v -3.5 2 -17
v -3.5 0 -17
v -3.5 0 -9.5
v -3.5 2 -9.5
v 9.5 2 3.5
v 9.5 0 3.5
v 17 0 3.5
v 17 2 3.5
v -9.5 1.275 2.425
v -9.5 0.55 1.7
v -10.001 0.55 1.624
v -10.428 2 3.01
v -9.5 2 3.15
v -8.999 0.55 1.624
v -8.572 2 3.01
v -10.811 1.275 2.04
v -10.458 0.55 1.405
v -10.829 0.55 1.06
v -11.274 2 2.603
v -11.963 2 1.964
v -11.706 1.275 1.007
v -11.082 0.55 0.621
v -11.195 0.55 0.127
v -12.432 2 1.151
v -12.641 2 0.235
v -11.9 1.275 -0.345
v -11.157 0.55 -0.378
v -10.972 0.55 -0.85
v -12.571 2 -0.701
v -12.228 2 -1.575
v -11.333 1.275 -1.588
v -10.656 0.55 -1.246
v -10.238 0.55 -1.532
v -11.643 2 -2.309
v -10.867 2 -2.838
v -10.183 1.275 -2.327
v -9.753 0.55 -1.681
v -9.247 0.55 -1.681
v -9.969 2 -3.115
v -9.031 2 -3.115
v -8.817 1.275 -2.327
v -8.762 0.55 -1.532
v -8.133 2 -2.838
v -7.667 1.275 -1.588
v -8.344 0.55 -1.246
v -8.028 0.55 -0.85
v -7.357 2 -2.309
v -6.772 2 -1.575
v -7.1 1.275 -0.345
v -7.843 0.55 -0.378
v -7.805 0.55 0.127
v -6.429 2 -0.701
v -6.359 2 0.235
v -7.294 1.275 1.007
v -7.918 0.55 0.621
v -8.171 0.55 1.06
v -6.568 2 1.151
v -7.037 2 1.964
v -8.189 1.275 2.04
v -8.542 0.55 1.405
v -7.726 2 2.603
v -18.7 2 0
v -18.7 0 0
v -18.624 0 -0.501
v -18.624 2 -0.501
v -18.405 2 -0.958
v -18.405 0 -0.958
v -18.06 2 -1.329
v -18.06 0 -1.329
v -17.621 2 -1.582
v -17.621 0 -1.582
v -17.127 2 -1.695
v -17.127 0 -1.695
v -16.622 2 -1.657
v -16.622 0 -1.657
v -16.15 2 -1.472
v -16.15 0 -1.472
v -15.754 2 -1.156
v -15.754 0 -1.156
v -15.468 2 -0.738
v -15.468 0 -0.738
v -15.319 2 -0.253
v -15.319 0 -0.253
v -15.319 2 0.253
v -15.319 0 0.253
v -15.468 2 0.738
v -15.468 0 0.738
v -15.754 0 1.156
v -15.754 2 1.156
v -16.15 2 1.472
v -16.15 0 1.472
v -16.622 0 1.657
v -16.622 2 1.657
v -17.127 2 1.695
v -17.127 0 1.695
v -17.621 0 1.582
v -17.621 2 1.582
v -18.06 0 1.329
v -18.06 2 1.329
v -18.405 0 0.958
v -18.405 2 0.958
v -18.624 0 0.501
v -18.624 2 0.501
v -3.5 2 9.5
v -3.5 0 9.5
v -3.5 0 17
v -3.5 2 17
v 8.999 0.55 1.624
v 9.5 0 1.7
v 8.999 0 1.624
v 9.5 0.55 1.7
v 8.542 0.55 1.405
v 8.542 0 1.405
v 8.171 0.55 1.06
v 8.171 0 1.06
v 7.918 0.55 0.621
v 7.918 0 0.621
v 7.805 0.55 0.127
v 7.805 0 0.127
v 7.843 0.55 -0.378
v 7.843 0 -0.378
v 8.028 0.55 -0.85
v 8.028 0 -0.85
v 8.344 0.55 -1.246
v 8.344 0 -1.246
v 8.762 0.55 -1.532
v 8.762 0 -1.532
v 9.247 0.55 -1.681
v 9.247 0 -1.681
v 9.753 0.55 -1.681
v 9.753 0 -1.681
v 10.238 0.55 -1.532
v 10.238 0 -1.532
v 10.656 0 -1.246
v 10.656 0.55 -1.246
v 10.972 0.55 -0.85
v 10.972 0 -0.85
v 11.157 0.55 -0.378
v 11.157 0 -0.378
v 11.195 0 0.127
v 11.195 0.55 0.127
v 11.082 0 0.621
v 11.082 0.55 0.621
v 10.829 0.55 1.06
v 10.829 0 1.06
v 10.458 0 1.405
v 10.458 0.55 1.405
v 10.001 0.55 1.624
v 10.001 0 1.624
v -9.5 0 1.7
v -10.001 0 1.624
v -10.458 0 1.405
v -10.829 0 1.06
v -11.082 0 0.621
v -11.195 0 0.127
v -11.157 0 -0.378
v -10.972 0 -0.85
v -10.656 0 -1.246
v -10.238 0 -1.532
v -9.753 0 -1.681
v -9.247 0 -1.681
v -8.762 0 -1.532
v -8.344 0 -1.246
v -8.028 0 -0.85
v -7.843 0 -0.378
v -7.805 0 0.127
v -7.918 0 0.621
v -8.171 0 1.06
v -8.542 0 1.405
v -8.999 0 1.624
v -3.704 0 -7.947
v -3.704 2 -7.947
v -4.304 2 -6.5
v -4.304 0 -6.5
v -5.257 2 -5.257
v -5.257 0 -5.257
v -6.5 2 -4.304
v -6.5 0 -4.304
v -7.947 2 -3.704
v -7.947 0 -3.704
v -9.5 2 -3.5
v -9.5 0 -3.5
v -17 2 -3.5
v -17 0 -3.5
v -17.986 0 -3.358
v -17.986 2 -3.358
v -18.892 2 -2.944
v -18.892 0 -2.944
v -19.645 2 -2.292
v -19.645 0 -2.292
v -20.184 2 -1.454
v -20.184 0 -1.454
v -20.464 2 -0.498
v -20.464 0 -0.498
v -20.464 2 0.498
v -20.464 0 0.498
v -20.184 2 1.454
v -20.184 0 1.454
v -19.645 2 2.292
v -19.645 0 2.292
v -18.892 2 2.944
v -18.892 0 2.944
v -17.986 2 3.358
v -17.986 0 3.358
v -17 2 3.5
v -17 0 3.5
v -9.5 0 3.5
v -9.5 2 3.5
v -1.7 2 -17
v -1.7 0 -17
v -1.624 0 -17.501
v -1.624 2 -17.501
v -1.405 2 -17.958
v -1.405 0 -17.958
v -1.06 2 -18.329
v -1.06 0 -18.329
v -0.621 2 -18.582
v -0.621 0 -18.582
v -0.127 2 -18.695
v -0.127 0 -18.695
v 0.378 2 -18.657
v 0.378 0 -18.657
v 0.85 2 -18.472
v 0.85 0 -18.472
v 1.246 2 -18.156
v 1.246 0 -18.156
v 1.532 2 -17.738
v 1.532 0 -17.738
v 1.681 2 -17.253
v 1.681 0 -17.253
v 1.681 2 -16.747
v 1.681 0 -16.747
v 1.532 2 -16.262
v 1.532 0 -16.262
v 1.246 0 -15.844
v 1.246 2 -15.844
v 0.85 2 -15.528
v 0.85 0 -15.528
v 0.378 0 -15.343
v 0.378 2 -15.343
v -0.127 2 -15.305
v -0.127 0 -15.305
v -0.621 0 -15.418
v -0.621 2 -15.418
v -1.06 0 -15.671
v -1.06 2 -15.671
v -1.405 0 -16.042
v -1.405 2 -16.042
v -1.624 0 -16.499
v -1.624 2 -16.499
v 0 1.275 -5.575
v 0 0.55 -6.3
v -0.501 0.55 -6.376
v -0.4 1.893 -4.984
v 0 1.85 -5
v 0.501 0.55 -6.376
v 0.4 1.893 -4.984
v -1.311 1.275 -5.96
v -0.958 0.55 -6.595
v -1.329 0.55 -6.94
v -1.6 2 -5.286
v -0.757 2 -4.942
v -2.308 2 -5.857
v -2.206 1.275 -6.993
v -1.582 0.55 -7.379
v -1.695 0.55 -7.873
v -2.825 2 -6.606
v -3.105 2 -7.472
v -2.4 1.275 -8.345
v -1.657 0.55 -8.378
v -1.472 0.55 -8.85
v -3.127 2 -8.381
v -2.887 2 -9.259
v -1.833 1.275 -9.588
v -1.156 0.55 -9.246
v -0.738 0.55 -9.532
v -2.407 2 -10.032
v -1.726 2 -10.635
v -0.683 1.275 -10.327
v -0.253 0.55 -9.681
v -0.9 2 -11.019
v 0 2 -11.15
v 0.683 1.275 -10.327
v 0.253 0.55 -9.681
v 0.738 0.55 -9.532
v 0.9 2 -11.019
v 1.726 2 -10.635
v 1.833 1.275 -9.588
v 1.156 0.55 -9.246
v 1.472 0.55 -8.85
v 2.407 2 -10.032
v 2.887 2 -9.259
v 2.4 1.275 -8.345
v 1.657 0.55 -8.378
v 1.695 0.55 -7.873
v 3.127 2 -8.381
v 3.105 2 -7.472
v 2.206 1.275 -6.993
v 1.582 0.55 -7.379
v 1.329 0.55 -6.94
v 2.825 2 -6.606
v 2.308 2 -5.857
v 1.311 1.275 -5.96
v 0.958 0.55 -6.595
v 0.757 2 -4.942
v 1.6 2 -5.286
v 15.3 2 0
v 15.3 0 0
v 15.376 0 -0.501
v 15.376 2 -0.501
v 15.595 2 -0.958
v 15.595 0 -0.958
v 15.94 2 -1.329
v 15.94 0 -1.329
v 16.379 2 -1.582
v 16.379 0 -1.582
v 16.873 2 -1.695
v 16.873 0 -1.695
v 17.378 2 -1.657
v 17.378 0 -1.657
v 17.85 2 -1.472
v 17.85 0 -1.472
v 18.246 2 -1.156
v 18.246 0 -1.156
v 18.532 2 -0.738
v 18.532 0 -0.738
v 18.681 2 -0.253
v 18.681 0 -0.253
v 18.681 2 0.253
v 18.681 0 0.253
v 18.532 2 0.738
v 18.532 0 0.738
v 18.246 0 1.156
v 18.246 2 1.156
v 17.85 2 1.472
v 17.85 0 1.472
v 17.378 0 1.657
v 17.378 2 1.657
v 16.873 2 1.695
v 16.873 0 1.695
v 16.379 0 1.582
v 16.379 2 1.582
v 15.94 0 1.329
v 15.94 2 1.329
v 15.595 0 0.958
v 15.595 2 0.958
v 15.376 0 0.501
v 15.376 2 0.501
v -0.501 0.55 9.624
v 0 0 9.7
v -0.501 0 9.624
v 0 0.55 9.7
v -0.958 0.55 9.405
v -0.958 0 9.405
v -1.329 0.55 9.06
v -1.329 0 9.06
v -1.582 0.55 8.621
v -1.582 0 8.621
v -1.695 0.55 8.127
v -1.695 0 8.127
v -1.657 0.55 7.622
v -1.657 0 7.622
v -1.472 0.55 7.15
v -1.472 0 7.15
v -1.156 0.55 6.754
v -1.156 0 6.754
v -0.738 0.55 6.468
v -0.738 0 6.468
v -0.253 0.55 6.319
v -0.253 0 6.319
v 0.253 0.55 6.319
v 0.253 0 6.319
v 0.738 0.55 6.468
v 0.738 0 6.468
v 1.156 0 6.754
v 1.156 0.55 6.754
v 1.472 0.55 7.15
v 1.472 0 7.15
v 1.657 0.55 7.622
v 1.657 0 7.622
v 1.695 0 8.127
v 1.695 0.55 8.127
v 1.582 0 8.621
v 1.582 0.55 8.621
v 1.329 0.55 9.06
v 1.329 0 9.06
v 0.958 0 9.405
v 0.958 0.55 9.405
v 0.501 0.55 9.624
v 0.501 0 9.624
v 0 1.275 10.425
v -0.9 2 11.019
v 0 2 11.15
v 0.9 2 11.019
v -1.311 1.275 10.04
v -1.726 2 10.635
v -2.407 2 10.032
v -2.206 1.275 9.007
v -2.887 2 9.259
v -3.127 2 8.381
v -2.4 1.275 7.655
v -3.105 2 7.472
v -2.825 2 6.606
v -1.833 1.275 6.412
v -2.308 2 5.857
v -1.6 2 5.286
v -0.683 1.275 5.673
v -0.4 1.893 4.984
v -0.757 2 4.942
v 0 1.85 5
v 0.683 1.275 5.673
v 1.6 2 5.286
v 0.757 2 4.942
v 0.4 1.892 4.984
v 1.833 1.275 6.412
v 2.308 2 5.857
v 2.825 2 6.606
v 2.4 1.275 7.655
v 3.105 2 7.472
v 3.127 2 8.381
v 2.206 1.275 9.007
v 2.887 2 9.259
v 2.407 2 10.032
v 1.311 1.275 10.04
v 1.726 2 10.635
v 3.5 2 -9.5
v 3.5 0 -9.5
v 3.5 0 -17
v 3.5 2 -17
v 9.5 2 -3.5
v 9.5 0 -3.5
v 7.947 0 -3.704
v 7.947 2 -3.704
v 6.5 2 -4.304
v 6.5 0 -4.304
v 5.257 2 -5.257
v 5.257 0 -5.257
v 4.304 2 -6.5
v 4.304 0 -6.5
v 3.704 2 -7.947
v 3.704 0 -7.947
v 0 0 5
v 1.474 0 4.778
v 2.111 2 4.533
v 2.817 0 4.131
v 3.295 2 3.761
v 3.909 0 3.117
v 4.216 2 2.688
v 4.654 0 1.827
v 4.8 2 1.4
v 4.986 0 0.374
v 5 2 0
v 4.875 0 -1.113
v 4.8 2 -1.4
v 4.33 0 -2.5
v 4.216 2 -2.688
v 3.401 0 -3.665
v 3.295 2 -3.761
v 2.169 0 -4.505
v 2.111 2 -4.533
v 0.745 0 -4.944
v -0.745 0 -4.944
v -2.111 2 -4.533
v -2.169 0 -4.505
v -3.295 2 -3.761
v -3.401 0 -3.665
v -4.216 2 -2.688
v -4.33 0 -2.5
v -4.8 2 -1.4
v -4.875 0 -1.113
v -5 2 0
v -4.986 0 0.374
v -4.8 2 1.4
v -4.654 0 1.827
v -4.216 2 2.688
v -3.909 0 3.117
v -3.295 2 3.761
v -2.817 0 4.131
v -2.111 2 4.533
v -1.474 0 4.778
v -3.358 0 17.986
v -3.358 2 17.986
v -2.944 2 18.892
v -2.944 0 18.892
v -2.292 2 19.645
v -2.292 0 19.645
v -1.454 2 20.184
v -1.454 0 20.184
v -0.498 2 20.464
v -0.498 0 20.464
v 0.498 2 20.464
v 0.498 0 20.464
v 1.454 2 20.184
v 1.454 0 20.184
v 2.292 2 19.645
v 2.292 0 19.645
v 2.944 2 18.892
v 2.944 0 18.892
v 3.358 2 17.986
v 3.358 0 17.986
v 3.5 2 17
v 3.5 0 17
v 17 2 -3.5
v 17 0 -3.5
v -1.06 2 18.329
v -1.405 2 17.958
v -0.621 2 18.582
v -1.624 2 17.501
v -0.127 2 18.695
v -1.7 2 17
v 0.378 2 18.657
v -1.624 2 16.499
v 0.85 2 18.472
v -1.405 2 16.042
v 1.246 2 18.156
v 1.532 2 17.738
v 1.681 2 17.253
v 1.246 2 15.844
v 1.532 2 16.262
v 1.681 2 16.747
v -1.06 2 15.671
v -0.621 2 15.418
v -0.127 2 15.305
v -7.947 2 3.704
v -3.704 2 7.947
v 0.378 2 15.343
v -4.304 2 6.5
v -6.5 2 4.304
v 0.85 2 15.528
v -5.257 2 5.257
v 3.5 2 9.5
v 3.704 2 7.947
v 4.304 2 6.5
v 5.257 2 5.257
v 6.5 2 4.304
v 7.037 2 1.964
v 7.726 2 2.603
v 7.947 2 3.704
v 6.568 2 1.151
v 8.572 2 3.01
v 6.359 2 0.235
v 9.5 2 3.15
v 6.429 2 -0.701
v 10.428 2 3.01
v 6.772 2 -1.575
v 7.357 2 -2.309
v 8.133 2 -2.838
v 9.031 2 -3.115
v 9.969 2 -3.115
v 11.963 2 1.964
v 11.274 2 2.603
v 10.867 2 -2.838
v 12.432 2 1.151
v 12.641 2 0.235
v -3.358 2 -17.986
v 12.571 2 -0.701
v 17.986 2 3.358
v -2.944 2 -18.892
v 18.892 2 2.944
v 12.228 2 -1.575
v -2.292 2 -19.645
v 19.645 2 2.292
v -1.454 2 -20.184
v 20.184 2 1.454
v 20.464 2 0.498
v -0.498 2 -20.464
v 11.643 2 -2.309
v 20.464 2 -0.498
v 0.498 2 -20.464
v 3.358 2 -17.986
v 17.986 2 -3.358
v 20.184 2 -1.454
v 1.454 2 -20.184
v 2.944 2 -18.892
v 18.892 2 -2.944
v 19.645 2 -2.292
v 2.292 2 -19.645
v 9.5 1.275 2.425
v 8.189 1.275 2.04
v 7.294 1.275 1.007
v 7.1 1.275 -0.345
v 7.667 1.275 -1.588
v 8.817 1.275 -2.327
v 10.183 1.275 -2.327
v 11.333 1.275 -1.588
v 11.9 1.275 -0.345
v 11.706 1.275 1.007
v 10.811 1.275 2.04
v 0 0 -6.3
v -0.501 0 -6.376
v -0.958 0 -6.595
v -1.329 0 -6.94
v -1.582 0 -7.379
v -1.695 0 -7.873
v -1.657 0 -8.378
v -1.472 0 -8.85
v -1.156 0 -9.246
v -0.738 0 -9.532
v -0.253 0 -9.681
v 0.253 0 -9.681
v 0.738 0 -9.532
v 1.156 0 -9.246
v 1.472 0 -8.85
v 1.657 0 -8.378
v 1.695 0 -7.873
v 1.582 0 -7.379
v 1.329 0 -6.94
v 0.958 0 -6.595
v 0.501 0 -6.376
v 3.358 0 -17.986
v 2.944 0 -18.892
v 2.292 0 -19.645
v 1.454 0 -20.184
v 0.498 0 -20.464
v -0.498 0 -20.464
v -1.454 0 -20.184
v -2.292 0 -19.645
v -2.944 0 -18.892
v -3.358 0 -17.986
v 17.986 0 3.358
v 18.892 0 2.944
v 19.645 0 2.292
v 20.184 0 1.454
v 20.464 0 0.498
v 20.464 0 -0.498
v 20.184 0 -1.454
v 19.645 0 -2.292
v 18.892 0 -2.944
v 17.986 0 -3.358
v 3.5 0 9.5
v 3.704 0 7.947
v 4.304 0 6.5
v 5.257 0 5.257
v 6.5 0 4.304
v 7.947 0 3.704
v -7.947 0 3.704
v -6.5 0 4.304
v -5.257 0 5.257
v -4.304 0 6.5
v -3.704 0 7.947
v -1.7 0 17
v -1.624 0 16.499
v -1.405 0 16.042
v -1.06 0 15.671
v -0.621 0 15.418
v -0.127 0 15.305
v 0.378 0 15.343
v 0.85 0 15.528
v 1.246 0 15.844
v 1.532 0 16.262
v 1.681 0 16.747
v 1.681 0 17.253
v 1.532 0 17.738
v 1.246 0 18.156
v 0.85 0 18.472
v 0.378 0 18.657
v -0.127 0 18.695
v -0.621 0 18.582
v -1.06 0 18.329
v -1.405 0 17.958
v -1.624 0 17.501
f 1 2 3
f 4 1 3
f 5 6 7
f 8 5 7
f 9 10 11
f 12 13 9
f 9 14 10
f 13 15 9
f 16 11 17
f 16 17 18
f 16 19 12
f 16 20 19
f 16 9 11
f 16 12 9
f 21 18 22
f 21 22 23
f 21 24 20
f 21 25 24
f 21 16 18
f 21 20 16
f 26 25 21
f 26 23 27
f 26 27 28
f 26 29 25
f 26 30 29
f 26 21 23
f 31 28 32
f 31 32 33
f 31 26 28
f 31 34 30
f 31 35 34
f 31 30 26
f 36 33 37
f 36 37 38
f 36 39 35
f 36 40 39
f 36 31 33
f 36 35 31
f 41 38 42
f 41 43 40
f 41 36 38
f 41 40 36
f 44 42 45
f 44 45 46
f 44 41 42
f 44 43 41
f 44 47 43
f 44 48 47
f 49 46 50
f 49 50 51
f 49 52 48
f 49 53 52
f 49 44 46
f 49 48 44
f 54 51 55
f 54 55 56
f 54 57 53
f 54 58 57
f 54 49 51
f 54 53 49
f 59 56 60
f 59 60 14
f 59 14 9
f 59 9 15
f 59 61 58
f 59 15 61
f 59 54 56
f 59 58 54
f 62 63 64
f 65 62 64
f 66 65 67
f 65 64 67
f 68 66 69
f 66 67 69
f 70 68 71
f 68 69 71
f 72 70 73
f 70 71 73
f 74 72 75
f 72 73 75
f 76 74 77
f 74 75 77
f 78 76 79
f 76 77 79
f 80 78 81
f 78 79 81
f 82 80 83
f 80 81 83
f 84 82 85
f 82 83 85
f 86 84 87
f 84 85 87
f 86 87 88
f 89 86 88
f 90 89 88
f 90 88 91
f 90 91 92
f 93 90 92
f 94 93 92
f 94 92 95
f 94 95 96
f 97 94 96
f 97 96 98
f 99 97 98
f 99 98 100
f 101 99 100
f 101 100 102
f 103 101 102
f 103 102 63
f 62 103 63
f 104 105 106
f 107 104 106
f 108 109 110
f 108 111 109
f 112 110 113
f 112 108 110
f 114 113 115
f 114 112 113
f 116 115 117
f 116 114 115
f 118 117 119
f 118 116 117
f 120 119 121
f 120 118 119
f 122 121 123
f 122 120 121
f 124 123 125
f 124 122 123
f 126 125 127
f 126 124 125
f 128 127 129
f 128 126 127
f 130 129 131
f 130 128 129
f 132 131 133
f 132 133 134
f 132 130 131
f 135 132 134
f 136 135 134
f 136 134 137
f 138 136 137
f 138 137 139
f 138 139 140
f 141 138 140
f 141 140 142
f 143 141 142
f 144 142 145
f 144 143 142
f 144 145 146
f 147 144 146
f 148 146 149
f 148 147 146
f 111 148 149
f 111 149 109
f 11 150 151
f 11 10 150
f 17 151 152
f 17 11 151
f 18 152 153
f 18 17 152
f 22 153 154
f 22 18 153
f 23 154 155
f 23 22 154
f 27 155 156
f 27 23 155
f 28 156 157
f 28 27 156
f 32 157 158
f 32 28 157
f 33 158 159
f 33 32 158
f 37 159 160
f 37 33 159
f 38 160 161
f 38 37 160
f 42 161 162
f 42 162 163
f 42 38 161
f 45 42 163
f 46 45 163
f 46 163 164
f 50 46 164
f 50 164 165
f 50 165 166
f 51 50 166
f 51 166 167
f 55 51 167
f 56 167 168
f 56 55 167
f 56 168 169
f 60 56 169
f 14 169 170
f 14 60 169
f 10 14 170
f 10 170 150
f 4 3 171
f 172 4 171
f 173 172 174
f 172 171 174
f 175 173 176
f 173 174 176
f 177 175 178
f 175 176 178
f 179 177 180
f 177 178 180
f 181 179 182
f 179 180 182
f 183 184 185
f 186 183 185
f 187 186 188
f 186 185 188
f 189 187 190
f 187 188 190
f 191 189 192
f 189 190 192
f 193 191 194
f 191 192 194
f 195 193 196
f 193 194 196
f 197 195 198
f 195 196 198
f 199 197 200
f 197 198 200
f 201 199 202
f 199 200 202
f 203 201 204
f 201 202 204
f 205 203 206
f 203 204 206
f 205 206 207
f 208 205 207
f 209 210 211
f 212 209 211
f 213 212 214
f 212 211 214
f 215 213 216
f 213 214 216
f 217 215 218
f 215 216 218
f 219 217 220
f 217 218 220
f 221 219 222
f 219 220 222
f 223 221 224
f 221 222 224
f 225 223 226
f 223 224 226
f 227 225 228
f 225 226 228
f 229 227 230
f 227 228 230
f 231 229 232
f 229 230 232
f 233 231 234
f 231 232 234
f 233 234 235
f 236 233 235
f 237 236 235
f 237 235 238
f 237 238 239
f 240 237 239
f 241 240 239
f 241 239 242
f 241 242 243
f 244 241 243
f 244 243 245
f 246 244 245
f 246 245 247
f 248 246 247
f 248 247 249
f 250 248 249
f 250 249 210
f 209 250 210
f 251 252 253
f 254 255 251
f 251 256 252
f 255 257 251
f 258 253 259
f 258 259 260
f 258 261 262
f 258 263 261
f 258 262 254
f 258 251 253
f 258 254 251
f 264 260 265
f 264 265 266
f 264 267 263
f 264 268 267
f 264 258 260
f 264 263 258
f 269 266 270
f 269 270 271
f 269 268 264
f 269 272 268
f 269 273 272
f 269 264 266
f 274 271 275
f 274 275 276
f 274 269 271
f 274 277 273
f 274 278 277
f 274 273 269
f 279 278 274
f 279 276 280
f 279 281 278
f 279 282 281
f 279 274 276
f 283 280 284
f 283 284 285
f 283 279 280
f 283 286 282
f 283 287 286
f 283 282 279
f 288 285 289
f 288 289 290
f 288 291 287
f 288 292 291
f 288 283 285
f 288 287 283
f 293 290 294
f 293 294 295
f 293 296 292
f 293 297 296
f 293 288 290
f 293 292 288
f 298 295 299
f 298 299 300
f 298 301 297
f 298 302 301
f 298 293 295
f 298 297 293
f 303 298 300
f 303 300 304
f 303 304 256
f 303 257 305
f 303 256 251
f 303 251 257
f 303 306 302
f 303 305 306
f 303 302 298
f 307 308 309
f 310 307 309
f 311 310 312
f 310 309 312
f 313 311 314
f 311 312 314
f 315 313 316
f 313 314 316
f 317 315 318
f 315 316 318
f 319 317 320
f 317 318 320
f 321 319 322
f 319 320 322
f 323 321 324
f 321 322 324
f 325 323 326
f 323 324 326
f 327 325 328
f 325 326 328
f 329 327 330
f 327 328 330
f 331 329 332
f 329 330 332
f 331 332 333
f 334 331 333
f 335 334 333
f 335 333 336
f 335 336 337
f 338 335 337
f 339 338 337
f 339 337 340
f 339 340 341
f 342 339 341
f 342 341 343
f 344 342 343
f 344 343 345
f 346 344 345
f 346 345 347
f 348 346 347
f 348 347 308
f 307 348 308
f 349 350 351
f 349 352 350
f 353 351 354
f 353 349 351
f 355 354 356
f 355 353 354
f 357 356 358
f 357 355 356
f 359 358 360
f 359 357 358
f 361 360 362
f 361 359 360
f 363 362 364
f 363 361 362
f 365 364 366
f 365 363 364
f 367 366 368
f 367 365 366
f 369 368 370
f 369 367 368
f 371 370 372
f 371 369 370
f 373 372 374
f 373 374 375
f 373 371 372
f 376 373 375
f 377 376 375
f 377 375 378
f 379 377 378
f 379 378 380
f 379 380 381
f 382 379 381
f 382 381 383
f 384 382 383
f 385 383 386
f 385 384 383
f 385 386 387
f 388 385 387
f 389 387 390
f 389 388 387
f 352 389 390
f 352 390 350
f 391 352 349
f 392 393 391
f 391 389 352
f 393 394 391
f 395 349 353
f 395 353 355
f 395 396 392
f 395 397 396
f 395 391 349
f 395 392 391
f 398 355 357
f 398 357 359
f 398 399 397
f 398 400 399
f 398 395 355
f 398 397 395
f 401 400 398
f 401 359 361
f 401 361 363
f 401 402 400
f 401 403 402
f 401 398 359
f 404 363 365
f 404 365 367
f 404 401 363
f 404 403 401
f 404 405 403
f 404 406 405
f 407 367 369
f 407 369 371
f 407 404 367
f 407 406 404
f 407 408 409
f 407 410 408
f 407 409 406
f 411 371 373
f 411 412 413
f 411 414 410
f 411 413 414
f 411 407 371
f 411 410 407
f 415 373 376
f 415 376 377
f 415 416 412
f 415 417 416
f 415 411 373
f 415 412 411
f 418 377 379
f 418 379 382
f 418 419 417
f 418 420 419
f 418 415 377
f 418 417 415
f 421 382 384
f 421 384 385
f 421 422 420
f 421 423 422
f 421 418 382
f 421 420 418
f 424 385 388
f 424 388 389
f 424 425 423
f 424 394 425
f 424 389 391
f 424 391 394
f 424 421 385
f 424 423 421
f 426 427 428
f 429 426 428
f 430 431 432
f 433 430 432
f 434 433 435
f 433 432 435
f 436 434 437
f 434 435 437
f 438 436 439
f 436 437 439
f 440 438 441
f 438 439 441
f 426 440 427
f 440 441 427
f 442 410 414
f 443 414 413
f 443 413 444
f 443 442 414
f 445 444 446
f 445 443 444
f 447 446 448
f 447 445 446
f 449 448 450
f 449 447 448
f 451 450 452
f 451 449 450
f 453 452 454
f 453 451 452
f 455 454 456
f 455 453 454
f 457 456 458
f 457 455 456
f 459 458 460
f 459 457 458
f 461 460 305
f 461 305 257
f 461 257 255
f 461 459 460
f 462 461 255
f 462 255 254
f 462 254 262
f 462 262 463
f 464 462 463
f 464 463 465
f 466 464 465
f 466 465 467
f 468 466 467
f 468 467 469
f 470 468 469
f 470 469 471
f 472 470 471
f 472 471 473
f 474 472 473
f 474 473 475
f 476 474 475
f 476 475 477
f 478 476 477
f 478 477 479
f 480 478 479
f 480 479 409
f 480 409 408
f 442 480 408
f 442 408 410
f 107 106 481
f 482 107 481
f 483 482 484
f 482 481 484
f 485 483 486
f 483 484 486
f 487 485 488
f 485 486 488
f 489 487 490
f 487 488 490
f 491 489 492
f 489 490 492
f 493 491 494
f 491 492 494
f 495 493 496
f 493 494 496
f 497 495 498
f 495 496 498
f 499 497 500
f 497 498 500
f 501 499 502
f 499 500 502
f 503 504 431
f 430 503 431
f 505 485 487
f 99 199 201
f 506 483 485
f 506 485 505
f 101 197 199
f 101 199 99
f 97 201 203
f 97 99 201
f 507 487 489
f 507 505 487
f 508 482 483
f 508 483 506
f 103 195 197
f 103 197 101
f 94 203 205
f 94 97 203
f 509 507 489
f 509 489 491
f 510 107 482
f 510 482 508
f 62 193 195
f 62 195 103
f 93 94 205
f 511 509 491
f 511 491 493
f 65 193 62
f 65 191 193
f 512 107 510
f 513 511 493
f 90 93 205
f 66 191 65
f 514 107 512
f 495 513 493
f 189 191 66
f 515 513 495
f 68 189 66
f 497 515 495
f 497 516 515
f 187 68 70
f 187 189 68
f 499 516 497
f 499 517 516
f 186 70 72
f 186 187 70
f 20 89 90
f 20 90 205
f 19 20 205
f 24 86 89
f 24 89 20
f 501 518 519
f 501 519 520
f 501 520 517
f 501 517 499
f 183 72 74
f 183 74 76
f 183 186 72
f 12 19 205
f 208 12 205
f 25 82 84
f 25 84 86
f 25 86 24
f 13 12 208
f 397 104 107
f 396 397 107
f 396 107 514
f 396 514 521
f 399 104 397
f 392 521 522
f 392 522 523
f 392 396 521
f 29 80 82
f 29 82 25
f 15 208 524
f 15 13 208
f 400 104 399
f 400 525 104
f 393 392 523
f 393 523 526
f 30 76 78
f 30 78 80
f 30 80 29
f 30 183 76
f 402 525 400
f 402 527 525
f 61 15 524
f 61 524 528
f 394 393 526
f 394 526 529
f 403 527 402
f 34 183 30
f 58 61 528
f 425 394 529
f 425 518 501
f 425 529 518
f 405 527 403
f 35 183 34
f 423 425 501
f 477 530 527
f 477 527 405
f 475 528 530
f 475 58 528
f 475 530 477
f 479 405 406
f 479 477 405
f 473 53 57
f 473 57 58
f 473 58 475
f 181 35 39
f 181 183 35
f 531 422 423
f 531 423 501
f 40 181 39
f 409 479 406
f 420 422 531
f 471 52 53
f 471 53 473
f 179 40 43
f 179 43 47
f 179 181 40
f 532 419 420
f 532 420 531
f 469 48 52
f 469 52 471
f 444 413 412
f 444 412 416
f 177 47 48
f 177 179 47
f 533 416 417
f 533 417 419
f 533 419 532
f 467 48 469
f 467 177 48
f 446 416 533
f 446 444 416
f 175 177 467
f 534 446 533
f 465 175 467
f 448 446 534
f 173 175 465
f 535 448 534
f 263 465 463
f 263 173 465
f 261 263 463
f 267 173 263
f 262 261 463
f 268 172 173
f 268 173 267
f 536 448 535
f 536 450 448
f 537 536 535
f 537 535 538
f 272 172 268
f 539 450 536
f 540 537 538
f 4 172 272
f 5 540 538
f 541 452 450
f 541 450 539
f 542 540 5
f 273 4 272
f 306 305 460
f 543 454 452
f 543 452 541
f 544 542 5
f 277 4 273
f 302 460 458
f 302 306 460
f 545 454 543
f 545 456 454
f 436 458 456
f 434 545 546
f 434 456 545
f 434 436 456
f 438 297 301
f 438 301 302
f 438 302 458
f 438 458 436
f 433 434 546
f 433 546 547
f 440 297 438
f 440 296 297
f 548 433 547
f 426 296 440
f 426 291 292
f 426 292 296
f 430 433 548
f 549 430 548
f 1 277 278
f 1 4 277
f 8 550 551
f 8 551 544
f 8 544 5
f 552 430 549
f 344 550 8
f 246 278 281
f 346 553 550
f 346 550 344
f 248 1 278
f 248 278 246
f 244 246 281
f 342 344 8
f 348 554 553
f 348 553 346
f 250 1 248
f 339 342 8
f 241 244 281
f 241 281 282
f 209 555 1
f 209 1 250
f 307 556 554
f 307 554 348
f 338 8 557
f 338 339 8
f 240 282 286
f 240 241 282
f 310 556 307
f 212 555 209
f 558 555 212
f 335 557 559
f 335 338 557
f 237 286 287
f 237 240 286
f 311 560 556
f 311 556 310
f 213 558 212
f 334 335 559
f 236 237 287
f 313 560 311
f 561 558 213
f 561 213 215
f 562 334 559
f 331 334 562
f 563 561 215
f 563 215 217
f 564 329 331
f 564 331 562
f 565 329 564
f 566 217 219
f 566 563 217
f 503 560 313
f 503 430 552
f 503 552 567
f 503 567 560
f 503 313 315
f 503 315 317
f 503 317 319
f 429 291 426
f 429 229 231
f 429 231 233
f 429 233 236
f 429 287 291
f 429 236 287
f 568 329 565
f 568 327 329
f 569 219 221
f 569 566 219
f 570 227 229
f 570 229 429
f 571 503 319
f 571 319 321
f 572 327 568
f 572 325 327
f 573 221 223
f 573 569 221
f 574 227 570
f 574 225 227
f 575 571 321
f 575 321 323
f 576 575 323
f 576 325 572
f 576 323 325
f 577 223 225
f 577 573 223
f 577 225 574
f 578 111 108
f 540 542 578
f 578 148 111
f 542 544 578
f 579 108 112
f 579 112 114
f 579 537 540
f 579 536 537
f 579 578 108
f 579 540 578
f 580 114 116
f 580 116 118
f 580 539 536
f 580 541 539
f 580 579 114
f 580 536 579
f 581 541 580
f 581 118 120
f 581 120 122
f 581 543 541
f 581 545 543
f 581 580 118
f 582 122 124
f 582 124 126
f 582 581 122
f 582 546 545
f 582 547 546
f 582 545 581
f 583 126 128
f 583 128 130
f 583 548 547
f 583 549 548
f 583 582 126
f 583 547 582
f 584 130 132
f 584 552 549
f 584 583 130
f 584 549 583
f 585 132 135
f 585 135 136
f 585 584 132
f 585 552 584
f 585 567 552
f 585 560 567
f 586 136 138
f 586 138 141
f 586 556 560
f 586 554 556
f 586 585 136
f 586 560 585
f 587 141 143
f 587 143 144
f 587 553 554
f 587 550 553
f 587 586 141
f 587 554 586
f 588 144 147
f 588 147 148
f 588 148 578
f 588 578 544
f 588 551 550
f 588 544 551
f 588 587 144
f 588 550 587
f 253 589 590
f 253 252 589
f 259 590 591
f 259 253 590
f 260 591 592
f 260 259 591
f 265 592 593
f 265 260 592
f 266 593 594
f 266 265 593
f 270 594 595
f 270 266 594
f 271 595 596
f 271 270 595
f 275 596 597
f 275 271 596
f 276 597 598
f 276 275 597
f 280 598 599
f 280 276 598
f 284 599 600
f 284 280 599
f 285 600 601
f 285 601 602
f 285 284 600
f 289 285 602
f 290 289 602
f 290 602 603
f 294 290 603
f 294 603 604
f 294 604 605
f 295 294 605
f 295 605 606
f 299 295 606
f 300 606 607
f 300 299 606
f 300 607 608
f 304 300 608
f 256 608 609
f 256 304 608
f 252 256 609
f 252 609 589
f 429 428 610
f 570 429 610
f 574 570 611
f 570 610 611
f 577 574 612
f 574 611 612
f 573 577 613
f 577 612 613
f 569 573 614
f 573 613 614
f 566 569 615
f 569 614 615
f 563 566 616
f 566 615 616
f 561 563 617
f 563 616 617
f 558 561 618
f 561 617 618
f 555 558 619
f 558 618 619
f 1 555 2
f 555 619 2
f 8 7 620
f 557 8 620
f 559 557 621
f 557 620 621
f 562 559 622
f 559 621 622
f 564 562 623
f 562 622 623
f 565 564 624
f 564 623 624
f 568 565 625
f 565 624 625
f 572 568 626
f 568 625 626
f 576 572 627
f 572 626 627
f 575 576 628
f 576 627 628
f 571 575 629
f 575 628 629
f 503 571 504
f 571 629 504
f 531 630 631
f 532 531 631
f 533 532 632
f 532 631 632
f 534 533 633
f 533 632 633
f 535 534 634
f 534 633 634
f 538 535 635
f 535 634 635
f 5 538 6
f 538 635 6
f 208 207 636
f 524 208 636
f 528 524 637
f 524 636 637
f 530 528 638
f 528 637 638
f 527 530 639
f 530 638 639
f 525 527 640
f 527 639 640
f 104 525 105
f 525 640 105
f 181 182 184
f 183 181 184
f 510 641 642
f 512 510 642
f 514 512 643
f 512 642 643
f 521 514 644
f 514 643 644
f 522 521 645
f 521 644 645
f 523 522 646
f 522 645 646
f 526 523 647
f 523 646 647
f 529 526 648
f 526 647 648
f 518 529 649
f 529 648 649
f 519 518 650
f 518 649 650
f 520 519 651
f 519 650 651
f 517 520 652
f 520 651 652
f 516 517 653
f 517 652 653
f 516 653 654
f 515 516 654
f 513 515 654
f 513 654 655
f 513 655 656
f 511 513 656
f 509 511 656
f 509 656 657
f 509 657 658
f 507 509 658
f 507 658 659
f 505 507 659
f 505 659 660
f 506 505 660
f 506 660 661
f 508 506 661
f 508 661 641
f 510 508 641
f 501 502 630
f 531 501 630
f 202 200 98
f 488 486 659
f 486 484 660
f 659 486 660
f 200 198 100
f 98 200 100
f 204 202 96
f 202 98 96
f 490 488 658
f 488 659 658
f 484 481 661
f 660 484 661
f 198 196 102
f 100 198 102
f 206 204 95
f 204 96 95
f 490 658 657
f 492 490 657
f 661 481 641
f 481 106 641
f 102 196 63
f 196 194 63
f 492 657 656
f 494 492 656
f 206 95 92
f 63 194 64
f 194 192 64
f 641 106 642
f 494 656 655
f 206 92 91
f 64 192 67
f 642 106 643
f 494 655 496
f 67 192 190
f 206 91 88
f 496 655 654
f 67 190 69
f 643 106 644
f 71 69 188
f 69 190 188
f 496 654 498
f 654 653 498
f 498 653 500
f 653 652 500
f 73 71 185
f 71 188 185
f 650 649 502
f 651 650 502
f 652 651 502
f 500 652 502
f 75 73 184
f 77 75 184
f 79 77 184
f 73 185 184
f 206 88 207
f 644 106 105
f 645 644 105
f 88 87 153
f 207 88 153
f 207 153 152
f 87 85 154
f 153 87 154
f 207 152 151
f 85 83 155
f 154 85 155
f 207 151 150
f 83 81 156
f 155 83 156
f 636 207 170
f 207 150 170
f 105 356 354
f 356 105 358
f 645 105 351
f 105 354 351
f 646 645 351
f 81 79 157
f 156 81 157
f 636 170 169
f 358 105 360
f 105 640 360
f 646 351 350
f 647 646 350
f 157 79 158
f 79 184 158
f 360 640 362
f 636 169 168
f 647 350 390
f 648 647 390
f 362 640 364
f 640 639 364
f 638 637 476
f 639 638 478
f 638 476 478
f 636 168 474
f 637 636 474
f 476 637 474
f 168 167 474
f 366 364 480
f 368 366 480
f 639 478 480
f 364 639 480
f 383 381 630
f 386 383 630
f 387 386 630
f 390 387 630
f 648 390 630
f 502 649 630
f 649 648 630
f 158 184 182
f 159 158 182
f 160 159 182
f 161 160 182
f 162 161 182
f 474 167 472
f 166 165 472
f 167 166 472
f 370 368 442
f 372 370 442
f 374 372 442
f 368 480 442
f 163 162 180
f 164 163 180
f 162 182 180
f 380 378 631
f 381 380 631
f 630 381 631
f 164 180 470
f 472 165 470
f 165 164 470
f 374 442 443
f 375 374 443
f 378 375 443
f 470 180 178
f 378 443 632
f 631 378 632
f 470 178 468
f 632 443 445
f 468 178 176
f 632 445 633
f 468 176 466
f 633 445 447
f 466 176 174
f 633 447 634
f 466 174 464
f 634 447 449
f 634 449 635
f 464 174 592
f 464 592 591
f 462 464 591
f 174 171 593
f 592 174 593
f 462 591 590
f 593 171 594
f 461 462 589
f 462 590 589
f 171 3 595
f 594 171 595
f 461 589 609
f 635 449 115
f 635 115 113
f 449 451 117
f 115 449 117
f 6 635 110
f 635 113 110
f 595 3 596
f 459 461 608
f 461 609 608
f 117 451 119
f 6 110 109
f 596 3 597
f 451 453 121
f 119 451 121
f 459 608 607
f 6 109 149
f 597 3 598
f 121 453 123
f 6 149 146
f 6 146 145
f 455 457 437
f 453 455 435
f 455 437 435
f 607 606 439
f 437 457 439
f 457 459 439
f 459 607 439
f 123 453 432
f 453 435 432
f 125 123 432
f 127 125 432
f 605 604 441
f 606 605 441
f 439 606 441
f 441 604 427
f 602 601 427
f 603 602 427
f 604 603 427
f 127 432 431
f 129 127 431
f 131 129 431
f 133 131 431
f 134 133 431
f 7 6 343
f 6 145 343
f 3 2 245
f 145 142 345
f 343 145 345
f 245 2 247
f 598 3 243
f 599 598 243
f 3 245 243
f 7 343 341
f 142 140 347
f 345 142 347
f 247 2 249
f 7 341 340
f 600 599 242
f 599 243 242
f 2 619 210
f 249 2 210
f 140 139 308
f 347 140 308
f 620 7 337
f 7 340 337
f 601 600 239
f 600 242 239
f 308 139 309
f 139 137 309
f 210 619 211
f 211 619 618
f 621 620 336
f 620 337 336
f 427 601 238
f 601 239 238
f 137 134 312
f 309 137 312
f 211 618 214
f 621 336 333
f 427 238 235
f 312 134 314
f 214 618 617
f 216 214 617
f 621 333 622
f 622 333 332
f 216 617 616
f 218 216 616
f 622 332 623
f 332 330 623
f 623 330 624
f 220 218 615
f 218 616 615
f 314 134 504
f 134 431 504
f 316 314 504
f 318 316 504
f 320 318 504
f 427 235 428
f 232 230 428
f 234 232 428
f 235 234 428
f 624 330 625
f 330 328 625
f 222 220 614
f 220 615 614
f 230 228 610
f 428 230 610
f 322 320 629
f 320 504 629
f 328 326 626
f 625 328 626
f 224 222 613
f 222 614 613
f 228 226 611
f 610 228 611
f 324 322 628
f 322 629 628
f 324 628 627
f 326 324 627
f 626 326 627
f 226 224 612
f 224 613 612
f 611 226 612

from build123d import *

# Parameters (mm, degrees)
SKETCH1_R                                      = 5
BOSS_EXTRUDE1_DEPTH                            = 2
M3_CLEARANCE_HOLE1_D                           = 3.4
CSK_FOR_M3_FLAT_HEAD_MACHINE_SCREW3_AT_2_COUNT = 2
CSK_FOR_M3_FLAT_HEAD_MACHINE_SCREW3_AT_2_PITCH = 12.419742348
CSK_FOR_M3_FLAT_HEAD_MACHINE_SCREW3_AT_3_COUNT = 2
CSK_FOR_M3_FLAT_HEAD_MACHINE_SCREW3_AT_3_PITCH = 16
CSK_FOR_M3_FLAT_HEAD_MACHINE_SCREW3_AT_4_COUNT = 2
CSK_FOR_M3_FLAT_HEAD_MACHINE_SCREW3_AT_4_PITCH = 12.419742348


with BuildPart() as part:
    # Sketch1 → Boss-Extrude1 (new body)
    with BuildSketch(Plane(origin=(0, 0, 0), x_dir=(1, 0, 0), z_dir=(0, 1, 0))):
        with BuildLine():
            Line((3.5, 9.5), (3.5, 17))
            ThreePointArc((3.5, 17), (0, 20.5), (-3.5, 17))
            Line((-3.5, 17), (-3.5, 9.5))
            ThreePointArc((-3.5, 9.5), (-5.257359313, 5.257359313), (-9.5, 3.5))
            Line((-9.5, 3.5), (-17, 3.5))
            ThreePointArc((-17, 3.5), (-20.5, 0), (-17, -3.5))
            Line((-17, -3.5), (-9.5, -3.5))
            ThreePointArc((-9.5, -3.5), (-5.257359313, -5.257359313), (-3.5, -9.5))
            Line((-3.5, -9.5), (-3.5, -17))
            ThreePointArc((-3.5, -17), (0, -20.5), (3.5, -17))
            Line((3.5, -17), (3.5, -9.5))
            ThreePointArc((3.5, -9.5), (5.257359313, -5.257359313), (9.5, -3.5))
            Line((9.5, -3.5), (17, -3.5))
            ThreePointArc((17, -3.5), (20.5, 0), (17, 3.5))
            Line((17, 3.5), (9.5, 3.5))
            ThreePointArc((9.5, 3.5), (5.257359313, 5.257359313), (3.5, 9.5))
        make_face()
        with Locations(Location((0, 0, 0), (0, 0, 270))):
            Circle(SKETCH1_R, mode=Mode.SUBTRACT)
    extrude(amount=BOSS_EXTRUDE1_DEPTH)

    # M3 Clearance Hole1 (through all)
    with Locations(Plane(origin=(0, 2, 0), x_dir=(1, 0, 0), z_dir=(0, 1, 0))):
        with Locations((0, 17), (-17, 0), (17, 0), (0, -17)):
            Hole(M3_CLEARANCE_HOLE1_D / 2)

    # Sketch8 → CSK for M3 Flat Head Machine Screw3 (revolve, cut)
    with BuildSketch(Plane(origin=(0, 2, -8), x_dir=(0, 0, 1), z_dir=(1, 0, 0))):
        Polygon((0, 0), (0, 2), (1.7, 2), (1.7, 1.45), (3.15, 0), align=None)
    csk_for_m3_flat_head_machine_screw3 = revolve(axis=Axis((0, 8.35, -8), (0, -1, 0)), mode=Mode.SUBTRACT)

    # CSK for M3 Flat Head Machine Screw3 at 2: CSK for M3 Flat Head Machine Screw3 ×2
    with Locations(*[Vector(-0.7649111981170509, 0, 0.6441357457827798) * (i * CSK_FOR_M3_FLAT_HEAD_MACHINE_SCREW3_AT_2_PITCH) for i in range(1, CSK_FOR_M3_FLAT_HEAD_MACHINE_SCREW3_AT_2_COUNT)]):
        add(csk_for_m3_flat_head_machine_screw3, mode=Mode.SUBTRACT)

    # CSK for M3 Flat Head Machine Screw3 at 3: CSK for M3 Flat Head Machine Screw3 ×2
    with Locations(*[(0, 0, i * CSK_FOR_M3_FLAT_HEAD_MACHINE_SCREW3_AT_3_PITCH) for i in range(1, CSK_FOR_M3_FLAT_HEAD_MACHINE_SCREW3_AT_3_COUNT)]):
        add(csk_for_m3_flat_head_machine_screw3, mode=Mode.SUBTRACT)

    # CSK for M3 Flat Head Machine Screw3 at 4: CSK for M3 Flat Head Machine Screw3 ×2
    with Locations(*[Vector(0.7649111981170508, 0, 0.6441357457827798) * (i * CSK_FOR_M3_FLAT_HEAD_MACHINE_SCREW3_AT_4_PITCH) for i in range(1, CSK_FOR_M3_FLAT_HEAD_MACHINE_SCREW3_AT_4_COUNT)]):
        add(csk_for_m3_flat_head_machine_screw3, mode=Mode.SUBTRACT)


solid = part.part
